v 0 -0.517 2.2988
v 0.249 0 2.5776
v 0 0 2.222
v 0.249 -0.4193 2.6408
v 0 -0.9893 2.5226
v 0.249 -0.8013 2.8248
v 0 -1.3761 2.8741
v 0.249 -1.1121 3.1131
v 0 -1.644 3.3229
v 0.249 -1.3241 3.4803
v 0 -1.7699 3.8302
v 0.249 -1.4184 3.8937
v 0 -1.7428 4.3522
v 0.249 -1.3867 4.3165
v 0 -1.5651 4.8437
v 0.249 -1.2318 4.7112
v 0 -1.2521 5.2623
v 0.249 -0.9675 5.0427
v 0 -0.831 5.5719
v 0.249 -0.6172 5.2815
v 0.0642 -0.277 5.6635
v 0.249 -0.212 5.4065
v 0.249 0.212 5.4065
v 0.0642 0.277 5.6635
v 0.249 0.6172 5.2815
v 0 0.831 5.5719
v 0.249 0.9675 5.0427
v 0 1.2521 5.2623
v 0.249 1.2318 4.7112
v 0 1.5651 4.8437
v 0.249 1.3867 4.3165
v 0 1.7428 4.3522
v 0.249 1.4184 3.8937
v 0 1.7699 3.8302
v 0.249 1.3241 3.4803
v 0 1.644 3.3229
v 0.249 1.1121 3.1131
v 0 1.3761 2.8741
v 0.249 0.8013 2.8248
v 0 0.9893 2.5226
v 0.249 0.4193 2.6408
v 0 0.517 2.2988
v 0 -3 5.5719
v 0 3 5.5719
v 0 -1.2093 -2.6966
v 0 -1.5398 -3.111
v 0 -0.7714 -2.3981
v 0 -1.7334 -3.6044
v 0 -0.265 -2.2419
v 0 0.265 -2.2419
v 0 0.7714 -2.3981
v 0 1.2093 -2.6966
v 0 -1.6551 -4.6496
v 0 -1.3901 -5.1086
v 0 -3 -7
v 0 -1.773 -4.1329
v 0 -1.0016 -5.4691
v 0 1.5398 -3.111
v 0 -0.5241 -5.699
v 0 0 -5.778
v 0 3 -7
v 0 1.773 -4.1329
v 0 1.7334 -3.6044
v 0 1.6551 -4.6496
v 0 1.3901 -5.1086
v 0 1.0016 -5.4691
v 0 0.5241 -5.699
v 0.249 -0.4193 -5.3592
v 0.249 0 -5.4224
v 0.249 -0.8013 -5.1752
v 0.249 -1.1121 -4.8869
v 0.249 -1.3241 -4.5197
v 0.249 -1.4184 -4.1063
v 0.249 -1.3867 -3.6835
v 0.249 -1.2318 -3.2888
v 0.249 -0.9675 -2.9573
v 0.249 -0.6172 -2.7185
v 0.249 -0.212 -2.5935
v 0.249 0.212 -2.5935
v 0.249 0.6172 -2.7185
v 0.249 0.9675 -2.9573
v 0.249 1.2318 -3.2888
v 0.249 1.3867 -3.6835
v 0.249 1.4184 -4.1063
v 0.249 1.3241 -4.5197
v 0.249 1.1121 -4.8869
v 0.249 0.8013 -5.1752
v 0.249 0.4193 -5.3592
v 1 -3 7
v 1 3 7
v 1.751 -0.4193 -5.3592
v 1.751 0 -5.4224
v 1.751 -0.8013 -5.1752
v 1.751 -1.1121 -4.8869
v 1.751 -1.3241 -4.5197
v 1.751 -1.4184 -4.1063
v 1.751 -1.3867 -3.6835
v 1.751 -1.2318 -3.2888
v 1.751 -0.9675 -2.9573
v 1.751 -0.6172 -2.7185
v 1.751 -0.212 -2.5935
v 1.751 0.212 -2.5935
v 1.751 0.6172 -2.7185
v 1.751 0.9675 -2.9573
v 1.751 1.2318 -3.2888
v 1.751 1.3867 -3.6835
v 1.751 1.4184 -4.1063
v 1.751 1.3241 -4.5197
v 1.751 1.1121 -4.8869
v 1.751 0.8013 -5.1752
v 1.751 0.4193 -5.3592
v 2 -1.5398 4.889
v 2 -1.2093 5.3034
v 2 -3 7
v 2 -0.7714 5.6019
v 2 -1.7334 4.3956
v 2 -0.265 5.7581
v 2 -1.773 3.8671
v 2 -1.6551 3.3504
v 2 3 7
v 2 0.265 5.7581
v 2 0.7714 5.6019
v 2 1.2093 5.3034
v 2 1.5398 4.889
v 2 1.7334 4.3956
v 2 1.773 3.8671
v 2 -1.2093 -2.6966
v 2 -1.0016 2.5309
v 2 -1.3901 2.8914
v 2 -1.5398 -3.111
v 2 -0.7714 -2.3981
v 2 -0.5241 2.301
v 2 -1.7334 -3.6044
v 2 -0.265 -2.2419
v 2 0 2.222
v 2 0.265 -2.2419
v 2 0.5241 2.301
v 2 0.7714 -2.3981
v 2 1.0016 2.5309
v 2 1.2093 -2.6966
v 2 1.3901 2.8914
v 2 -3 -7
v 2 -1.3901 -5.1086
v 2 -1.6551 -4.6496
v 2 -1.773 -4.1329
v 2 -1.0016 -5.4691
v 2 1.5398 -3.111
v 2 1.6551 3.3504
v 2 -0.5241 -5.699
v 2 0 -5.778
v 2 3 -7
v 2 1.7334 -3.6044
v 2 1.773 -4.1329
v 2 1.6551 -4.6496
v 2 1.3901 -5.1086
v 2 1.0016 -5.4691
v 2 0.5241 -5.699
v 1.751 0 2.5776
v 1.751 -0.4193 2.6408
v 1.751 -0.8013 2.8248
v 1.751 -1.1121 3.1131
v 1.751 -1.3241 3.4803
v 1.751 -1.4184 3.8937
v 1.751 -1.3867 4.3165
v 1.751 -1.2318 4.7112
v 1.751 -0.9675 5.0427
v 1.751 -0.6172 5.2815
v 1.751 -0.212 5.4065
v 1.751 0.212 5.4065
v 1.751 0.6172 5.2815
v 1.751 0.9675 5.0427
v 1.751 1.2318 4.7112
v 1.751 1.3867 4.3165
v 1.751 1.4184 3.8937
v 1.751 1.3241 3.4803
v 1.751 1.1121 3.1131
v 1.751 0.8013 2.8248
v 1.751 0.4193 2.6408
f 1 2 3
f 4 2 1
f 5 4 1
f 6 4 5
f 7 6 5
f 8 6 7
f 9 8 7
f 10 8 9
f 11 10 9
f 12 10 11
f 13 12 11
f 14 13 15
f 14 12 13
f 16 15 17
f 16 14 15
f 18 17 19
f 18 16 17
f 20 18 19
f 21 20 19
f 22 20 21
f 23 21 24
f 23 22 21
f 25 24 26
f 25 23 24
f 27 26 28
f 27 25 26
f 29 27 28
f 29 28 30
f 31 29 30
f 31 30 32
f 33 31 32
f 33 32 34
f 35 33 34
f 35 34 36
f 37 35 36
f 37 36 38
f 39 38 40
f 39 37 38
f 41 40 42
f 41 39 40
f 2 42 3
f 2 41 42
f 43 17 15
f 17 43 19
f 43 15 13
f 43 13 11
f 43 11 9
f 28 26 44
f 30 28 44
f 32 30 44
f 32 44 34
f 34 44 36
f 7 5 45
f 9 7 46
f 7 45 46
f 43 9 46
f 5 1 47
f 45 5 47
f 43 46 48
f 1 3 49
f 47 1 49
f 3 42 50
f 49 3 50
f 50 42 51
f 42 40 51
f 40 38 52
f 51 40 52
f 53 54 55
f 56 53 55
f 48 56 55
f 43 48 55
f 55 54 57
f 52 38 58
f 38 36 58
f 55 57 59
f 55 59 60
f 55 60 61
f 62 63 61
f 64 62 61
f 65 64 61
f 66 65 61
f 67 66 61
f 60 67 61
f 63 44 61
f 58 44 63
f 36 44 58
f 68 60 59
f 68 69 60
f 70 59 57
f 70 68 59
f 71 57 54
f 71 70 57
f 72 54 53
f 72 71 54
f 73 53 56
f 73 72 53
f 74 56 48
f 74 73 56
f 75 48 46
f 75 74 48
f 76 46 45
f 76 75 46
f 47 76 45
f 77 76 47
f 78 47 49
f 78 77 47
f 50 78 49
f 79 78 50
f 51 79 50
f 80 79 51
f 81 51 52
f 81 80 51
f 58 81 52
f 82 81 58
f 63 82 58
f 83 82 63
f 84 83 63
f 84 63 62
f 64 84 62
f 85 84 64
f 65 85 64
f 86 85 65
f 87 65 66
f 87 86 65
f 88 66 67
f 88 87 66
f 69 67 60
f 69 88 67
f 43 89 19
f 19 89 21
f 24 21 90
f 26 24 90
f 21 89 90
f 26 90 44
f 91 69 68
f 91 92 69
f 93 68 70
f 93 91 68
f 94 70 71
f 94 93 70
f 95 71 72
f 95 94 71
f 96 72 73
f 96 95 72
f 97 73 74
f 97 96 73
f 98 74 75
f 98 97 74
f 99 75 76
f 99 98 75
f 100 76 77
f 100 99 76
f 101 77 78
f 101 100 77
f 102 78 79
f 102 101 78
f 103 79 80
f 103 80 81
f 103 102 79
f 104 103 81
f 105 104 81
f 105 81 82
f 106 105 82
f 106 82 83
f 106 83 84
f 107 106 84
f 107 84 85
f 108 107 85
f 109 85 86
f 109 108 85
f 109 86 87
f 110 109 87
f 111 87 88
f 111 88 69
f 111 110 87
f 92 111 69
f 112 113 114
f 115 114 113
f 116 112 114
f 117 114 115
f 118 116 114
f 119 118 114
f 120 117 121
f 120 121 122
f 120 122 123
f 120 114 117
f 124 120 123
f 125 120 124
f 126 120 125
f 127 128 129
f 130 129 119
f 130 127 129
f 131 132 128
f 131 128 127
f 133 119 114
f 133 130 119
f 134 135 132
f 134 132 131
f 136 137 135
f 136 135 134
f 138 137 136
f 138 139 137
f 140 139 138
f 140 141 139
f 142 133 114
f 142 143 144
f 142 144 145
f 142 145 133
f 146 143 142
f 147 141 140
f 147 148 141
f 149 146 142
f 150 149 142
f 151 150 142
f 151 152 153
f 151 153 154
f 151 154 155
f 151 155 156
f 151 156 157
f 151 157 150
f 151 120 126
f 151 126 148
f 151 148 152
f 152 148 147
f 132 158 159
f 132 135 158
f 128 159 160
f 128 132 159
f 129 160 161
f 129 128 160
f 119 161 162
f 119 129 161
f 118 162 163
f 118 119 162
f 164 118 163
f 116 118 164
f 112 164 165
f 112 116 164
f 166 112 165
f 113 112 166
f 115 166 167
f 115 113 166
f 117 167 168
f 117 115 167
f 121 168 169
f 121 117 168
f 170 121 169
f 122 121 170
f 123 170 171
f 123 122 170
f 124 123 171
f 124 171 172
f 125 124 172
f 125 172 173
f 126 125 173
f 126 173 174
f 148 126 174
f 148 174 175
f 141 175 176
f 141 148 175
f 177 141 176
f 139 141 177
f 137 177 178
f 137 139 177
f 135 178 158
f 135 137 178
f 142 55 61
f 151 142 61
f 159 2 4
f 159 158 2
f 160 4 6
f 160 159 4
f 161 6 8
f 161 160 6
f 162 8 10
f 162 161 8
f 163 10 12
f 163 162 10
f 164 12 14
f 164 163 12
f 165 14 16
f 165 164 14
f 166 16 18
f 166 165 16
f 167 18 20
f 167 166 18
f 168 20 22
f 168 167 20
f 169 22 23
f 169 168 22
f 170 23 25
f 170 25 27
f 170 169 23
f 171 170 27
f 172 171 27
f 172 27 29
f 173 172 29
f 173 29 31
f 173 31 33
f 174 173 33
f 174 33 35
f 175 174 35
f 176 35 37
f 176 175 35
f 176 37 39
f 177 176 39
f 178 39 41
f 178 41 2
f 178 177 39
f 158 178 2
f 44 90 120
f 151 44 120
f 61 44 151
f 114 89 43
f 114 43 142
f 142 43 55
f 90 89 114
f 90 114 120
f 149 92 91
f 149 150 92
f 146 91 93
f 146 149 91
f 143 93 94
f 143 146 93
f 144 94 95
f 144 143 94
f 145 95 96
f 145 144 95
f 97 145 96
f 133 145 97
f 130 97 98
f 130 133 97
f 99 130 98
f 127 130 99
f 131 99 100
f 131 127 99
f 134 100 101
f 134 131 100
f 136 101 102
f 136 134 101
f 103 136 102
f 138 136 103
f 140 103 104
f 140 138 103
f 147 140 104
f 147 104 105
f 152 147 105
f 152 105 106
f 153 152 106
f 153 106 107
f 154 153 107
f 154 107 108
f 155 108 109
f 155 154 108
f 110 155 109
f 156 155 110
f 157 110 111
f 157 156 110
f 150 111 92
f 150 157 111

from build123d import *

# Parameters (mm, degrees)
SKETCH_1_W                   = 14
SKETCH_1_H                   = 6
EXTRUDE_1_DEPTH              = 2
HOLE_WIZARD_4_401_AT_2_COUNT = 2
HOLE_WIZARD_4_401_AT_2_PITCH = 8
CHAMFER_1_SIZE               = 1
CHAMFER_1_SIZE_2             = 1.428148007


with BuildPart() as part:
    # Эскиз1 → Бобышка-Вытянуть1 (new body)
    with BuildSketch(Plane(origin=(0, 0, 0), x_dir=(0, 0, -1), z_dir=(1, 0, 0))):
        Rectangle(SKETCH_1_W, SKETCH_1_H)
    extrude(amount=EXTRUDE_1_DEPTH)

    # Эскиз4 → Отверстие обработанное метчиком #4-401 (revolve, cut)
    with BuildSketch(Plane(origin=(2, 0, 4), x_dir=(0, 0, -1), z_dir=(0, 1, 0))):
        Polygon((0, 0), (0, 2), (1.778, 2), (1.4224, 1.751006199), (1.4224, 0.248993801), (1.778, 0), align=None)
    hole_wizard_4_401 = revolve(axis=Axis((8.35, 0, 4), (-1, 0, 0)), mode=Mode.SUBTRACT)

    # Отверстие обработанное метчиком #4-401 at 2: Отверстие обработанное метчиком #4-401 ×2
    with Locations(*[(0, 0, -i * HOLE_WIZARD_4_401_AT_2_PITCH) for i in range(1, HOLE_WIZARD_4_401_AT_2_COUNT)]):
        add(hole_wizard_4_401, mode=Mode.SUBTRACT)

    # Фаска1
    # the kernel refuses this chamfer: 1.428148007, 1 mm, written as the material it takes off along each edge
    with BuildSketch(Plane(origin=(0, 6.68826682, 7), x_dir=(0.9989750717851554, 0, 0.04526373771402103), z_dir=(0, -1, 0))) as chamfer_1_piece_1:
        Polygon((CHAMFER_1_SIZE * 0.998975071785, -CHAMFER_1_SIZE * 0.045263737714), (-CHAMFER_1_SIZE_2 * 0.0452637377058, -CHAMFER_1_SIZE_2 * 0.998975071605), (0, 0), align=None)
    extrude(amount=13.37653364, mode=Mode.SUBTRACT)


solid = part.part
